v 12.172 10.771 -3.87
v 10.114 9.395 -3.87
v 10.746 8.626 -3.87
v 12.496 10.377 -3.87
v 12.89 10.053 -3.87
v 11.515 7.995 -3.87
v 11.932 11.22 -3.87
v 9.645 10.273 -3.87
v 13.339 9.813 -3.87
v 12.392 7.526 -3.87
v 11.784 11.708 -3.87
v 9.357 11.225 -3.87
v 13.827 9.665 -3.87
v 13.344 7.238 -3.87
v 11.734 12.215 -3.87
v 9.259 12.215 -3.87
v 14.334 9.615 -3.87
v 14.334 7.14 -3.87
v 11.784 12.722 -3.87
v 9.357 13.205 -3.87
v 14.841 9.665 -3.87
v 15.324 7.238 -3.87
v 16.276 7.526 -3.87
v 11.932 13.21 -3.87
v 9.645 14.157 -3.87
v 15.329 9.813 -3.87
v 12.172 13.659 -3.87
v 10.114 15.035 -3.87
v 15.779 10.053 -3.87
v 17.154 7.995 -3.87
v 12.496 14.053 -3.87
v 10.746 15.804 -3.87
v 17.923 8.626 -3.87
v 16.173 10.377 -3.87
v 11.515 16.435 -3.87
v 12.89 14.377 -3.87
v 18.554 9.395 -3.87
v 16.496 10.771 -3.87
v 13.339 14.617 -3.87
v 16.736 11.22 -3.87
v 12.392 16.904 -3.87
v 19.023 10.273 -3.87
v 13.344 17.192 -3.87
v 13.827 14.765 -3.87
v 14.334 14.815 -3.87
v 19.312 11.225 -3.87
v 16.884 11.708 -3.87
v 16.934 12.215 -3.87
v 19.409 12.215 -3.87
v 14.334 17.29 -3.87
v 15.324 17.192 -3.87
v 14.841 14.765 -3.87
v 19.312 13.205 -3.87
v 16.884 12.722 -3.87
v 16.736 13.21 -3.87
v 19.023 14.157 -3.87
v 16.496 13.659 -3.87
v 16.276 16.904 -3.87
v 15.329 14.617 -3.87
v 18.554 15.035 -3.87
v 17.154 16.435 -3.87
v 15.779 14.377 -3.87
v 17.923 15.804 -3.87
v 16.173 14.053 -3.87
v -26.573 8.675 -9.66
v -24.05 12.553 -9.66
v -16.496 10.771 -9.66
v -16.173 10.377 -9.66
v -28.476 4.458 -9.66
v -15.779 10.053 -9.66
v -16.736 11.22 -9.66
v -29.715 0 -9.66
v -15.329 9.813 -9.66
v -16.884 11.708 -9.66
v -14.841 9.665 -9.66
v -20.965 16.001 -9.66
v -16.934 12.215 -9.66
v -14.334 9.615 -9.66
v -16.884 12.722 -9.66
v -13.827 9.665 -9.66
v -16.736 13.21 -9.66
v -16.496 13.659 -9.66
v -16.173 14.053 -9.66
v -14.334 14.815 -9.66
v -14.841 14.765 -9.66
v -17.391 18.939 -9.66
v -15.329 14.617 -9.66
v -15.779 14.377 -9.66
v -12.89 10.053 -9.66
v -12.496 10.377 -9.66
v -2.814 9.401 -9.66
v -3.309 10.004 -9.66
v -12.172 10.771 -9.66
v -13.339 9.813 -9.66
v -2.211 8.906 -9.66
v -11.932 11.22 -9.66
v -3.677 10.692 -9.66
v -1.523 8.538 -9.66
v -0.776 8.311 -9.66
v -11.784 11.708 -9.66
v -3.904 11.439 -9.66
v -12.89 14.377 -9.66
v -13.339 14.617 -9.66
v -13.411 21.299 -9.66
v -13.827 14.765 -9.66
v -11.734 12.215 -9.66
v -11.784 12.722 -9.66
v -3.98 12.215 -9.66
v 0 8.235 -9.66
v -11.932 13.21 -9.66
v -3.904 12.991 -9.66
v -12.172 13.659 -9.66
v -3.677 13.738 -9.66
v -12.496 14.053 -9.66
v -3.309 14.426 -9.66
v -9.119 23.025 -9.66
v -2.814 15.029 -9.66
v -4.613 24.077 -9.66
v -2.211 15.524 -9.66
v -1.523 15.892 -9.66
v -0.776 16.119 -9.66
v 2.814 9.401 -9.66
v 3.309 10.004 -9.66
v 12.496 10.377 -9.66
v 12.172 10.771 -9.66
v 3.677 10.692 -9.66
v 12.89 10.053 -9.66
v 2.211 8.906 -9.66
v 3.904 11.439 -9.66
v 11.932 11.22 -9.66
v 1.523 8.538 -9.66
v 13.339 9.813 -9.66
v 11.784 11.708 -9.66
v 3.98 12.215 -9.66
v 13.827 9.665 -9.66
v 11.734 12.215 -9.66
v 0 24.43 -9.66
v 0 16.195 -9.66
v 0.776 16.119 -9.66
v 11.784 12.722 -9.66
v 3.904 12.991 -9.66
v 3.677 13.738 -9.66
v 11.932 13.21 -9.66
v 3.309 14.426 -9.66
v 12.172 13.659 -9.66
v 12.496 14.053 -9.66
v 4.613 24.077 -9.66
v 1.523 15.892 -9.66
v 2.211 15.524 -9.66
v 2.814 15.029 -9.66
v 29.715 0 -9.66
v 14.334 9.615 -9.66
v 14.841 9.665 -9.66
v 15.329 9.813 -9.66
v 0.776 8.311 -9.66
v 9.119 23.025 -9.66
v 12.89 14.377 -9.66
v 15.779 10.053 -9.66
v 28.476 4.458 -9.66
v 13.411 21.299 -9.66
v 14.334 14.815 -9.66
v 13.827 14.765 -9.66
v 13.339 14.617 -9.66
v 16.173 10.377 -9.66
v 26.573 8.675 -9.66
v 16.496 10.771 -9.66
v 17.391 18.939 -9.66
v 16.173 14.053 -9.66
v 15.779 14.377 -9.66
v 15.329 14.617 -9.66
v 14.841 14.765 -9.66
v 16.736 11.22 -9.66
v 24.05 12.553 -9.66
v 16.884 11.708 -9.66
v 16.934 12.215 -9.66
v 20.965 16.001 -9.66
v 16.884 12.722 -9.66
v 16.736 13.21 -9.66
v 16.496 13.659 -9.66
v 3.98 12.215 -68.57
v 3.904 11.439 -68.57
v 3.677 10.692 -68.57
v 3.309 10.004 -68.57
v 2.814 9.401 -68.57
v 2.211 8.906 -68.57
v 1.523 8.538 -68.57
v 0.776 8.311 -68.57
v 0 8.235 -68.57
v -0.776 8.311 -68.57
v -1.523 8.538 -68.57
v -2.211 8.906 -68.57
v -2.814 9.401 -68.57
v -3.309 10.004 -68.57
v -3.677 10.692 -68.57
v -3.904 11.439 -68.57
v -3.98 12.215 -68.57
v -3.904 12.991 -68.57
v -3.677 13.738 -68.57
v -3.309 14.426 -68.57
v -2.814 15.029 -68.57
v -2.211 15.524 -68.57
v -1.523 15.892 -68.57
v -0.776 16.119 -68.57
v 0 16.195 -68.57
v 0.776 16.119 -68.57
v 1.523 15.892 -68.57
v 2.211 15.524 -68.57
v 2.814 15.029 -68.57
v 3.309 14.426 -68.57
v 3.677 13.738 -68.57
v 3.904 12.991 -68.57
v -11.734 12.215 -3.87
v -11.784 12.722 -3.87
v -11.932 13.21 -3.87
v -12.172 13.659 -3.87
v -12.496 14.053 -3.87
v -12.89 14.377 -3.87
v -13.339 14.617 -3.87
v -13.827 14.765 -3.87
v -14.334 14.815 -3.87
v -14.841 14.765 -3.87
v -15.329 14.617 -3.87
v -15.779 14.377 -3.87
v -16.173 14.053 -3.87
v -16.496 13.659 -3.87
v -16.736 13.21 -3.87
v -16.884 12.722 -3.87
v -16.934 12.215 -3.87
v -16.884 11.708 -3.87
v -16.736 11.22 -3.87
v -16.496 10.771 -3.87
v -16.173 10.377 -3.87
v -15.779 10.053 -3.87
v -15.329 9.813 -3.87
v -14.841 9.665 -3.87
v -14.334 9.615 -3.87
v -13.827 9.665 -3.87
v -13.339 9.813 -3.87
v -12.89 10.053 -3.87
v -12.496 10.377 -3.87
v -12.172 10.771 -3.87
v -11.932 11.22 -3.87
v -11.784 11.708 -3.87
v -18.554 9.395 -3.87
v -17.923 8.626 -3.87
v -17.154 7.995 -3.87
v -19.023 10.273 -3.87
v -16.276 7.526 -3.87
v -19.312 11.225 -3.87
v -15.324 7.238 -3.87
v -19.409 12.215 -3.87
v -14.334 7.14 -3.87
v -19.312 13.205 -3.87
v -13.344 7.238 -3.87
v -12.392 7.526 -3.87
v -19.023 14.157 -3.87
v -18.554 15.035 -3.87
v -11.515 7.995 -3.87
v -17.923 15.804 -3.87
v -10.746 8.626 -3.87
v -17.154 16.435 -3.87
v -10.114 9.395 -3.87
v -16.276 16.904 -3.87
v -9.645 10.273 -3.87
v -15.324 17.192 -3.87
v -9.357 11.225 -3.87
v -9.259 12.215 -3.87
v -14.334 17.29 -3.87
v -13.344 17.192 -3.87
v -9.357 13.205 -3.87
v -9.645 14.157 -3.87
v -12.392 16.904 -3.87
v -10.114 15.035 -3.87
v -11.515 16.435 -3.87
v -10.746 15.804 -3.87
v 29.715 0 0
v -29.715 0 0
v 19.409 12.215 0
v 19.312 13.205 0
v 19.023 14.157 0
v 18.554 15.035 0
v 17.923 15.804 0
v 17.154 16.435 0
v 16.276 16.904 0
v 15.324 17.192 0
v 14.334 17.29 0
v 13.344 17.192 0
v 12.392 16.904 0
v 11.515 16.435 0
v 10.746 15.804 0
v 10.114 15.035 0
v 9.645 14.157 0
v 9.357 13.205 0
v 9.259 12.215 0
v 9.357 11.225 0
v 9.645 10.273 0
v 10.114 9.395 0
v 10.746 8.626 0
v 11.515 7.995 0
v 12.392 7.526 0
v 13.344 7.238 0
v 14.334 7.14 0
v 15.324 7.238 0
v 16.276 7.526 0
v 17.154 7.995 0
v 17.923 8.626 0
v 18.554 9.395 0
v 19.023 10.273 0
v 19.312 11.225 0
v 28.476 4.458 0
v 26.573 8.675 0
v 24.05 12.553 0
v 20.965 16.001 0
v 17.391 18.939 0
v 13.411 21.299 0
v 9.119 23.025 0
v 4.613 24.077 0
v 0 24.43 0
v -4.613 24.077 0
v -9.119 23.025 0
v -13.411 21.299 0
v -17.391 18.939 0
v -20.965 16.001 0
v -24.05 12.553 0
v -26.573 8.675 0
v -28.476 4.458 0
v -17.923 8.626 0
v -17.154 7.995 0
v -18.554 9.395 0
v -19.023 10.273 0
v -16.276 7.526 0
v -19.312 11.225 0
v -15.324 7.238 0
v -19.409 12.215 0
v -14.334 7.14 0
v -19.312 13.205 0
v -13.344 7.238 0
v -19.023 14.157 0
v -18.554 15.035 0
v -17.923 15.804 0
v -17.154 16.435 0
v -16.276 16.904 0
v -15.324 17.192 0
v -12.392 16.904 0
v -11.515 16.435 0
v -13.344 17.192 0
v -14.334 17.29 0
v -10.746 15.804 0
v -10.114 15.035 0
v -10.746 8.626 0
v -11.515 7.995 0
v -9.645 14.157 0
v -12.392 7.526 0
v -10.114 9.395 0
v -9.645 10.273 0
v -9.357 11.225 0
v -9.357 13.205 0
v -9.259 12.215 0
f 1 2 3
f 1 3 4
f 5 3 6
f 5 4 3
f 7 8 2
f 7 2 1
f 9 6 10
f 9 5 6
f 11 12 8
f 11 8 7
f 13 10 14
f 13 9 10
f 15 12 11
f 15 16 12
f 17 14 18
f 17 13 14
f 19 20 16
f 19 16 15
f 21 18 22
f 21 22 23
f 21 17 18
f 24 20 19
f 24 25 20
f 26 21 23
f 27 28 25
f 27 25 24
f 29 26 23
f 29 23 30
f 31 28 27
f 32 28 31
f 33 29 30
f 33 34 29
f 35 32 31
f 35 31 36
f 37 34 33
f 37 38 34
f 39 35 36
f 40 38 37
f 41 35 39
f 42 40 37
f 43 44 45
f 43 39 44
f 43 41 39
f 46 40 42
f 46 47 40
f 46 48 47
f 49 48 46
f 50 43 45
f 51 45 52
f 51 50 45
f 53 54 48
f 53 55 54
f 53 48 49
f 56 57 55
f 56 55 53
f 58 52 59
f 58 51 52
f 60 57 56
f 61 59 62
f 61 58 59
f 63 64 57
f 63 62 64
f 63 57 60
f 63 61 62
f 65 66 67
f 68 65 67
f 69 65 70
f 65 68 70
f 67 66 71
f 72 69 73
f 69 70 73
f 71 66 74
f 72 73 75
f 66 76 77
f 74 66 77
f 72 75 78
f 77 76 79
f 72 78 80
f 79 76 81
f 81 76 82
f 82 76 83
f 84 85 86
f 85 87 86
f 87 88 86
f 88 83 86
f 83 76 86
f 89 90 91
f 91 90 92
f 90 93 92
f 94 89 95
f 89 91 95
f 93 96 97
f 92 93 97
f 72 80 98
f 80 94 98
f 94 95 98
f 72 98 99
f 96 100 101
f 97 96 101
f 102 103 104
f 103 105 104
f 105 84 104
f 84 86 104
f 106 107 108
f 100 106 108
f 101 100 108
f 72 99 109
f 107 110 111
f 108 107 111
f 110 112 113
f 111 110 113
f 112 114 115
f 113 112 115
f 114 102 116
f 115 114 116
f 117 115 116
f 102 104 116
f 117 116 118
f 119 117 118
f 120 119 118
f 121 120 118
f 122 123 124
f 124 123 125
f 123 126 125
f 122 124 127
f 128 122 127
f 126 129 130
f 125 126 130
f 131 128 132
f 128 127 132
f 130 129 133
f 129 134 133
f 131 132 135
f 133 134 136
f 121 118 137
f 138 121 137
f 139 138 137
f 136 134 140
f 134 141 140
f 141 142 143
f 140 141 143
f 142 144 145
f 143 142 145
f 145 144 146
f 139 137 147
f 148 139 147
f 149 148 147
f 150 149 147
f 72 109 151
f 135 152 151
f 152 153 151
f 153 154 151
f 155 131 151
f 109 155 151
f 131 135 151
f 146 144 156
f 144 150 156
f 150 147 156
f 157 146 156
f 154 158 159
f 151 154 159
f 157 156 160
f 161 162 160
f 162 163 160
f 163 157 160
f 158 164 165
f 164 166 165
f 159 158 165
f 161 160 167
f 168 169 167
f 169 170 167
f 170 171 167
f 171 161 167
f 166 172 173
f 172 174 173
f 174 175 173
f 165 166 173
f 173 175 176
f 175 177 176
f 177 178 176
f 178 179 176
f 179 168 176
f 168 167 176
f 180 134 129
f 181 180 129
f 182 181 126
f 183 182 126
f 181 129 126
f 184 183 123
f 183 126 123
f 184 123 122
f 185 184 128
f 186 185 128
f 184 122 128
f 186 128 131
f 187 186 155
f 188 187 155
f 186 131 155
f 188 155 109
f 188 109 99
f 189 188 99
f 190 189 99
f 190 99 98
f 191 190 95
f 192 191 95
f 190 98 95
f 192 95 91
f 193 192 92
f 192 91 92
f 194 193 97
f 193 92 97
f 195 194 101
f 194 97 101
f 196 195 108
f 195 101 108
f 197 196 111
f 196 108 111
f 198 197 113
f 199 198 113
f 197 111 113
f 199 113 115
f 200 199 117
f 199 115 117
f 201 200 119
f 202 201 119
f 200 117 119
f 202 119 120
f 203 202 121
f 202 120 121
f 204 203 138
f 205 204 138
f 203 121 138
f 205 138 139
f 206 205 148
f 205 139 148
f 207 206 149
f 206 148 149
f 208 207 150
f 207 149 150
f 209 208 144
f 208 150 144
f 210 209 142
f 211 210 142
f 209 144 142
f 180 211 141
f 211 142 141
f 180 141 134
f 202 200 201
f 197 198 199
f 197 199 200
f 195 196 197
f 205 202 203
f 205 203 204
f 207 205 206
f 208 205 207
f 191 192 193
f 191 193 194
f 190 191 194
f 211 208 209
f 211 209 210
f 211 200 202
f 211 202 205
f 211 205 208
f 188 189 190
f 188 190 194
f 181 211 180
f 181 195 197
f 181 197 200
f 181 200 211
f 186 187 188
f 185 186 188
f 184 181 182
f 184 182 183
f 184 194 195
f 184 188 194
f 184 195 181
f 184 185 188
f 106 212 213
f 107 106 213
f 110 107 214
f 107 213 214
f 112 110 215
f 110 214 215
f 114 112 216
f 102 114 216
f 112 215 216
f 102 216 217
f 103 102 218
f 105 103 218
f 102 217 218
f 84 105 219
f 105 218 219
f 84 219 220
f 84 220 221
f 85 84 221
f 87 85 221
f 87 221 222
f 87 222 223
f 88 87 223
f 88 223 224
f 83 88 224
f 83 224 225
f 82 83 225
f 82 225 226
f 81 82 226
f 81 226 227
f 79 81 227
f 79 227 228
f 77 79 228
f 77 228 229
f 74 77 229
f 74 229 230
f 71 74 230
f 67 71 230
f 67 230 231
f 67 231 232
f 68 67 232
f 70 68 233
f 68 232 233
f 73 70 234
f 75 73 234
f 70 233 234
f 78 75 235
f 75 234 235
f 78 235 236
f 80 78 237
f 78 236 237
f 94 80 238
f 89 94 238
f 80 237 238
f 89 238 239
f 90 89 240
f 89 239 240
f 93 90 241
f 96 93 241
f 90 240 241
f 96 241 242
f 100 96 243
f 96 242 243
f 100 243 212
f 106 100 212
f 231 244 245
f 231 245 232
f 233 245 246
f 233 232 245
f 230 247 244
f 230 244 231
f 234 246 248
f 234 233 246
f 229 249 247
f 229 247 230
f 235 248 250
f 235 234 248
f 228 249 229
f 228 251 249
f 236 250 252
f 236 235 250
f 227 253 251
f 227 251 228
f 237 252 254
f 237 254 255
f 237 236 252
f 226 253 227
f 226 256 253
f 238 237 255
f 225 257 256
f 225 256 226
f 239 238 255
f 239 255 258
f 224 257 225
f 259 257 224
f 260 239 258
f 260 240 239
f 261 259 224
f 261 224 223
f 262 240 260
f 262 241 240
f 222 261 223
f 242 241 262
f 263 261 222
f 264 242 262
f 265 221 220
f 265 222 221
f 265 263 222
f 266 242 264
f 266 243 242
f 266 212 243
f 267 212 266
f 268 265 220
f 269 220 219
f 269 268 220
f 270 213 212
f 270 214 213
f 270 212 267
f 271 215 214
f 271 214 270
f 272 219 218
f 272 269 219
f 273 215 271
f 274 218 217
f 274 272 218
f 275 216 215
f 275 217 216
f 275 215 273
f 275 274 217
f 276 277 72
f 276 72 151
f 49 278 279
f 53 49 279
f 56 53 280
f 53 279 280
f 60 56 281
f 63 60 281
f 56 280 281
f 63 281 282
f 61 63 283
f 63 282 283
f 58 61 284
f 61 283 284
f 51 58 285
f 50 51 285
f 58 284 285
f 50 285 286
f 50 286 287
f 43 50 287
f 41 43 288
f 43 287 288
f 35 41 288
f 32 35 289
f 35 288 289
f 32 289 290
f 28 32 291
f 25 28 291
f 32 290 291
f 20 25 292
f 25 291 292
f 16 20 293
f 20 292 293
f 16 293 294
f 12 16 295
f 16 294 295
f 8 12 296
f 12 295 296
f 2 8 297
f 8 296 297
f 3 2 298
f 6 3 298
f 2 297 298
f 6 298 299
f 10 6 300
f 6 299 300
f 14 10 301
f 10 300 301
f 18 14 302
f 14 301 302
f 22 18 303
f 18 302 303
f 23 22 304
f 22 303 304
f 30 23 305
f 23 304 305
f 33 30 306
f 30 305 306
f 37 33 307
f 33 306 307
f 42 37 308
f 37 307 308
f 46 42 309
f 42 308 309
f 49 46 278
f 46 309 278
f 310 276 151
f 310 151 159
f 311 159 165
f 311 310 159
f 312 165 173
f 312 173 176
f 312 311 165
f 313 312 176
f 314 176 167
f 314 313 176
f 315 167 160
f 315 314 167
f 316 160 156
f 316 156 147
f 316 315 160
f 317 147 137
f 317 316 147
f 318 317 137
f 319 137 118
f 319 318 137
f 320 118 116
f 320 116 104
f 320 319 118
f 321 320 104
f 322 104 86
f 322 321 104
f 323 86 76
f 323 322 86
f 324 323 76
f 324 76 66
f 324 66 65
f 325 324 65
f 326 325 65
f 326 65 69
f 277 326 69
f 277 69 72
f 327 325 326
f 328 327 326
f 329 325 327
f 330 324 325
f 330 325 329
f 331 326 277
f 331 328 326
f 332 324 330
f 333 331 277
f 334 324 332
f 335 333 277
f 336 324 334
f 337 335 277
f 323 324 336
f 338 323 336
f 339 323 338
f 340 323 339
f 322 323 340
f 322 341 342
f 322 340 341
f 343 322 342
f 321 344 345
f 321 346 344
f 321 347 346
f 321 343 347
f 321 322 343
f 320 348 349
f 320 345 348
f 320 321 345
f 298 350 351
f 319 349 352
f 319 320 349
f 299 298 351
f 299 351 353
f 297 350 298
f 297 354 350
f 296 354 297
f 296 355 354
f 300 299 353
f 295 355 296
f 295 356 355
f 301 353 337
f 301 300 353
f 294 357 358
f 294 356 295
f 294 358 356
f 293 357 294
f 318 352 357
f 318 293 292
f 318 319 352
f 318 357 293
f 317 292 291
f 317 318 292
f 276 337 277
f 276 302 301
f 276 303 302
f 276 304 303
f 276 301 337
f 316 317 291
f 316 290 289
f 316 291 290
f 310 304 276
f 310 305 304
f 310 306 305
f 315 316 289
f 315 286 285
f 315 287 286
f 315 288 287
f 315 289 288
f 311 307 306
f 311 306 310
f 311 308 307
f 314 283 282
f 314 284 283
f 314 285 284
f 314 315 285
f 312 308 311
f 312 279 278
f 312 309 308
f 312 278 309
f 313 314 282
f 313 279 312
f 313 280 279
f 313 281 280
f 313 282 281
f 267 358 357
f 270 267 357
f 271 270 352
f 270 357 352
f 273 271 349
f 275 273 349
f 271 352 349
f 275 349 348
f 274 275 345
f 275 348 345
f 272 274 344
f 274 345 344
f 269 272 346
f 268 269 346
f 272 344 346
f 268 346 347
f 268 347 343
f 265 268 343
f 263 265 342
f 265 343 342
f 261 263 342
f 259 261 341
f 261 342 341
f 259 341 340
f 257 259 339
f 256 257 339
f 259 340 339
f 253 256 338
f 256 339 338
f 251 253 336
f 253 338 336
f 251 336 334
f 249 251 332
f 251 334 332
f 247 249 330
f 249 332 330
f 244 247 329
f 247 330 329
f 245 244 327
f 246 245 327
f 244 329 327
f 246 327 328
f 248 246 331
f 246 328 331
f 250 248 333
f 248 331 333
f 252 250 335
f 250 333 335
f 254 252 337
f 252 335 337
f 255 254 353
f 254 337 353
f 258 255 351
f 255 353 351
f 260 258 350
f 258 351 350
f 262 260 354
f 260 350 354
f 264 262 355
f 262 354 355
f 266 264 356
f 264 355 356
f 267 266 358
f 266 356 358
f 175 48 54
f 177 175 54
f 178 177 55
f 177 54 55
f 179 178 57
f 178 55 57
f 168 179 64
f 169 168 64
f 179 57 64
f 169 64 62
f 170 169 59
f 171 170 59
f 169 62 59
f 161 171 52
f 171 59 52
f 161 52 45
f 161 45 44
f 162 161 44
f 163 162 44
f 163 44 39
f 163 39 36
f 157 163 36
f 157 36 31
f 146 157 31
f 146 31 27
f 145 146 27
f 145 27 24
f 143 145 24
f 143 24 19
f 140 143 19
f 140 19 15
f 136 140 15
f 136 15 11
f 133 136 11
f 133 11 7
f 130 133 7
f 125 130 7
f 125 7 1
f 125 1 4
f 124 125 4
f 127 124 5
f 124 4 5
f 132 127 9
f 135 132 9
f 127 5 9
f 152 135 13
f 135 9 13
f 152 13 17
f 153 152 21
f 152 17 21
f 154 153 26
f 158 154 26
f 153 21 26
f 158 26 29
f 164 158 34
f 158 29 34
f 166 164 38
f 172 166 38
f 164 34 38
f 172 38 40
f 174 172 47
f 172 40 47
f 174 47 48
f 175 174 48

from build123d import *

# Parameters (mm, degrees)
SALIENTE_EXTRUIR1_DEPTH = 9.66
CROQUIS2_R              = 3.98
SALIENTE_EXTRUIR2_DEPTH = 58.91
CORTAR_EXTRUIR1_REACH   = 80.623
CROQUIS3_R              = 2.6
CROQUIS4_R              = 5.075
CORTAR_EXTRUIR2_DEPTH   = 3.87


with BuildPart() as part:
    # Croquis1 → Saliente-Extruir1 (new body)
    with BuildSketch(Plane.XY):
        with BuildLine():
            Line((-29.715, 0), (29.715, 0))
            ThreePointArc((29.715, 0), (0, 24.43), (-29.715, 0))
        make_face()
    extrude(amount=-SALIENTE_EXTRUIR1_DEPTH)

    # Croquis2 → Saliente-Extruir2 (add)
    with BuildSketch(Plane(origin=(0, 0, -9.66), x_dir=(-1, 0, 0), z_dir=(0, 0, -1))):
        with Locations(Location((0, 12.215, 0), (0, 0, 180))):
            Circle(CROQUIS2_R)
    extrude(amount=SALIENTE_EXTRUIR2_DEPTH)

    # Croquis3 → Cortar-Extruir1 (cut, up to next)
    with BuildSketch(Plane.XY, mode=Mode.PRIVATE) as cortar_extruir1_sk1:
        with Locations((-14.334085257, 12.215)):
            Circle(CROQUIS3_R)
    cortar_extruir1_tool1 = extrude(cortar_extruir1_sk1.sketch, amount=-CORTAR_EXTRUIR1_REACH, mode=Mode.PRIVATE) & part.part
    # Croquis3 → Cortar-Extruir1 (cut, up to next)
    with BuildSketch(Plane.XY, mode=Mode.PRIVATE) as cortar_extruir1_sk2:
        with Locations((14.334085257, 12.215)):
            Circle(CROQUIS3_R)
    cortar_extruir1_tool2 = extrude(cortar_extruir1_sk2.sketch, amount=-CORTAR_EXTRUIR1_REACH, mode=Mode.PRIVATE) & part.part
    add(cortar_extruir1_tool1.solids().sort_by_distance((-14.334085, 12.215, 0))[0], mode=Mode.SUBTRACT)
    add(cortar_extruir1_tool2.solids().sort_by_distance((14.334085, 12.215, 0))[0], mode=Mode.SUBTRACT)

    # Croquis4 → Cortar-Extruir2 (cut)
    with BuildSketch(Plane.XY):
        with Locations((14.334085257, 12.215)):
            Circle(CROQUIS4_R)
        with Locations((-14.334085257, 12.215)):
            Circle(CROQUIS4_R)
    extrude(amount=-CORTAR_EXTRUIR2_DEPTH, mode=Mode.SUBTRACT)


solid = part.part
